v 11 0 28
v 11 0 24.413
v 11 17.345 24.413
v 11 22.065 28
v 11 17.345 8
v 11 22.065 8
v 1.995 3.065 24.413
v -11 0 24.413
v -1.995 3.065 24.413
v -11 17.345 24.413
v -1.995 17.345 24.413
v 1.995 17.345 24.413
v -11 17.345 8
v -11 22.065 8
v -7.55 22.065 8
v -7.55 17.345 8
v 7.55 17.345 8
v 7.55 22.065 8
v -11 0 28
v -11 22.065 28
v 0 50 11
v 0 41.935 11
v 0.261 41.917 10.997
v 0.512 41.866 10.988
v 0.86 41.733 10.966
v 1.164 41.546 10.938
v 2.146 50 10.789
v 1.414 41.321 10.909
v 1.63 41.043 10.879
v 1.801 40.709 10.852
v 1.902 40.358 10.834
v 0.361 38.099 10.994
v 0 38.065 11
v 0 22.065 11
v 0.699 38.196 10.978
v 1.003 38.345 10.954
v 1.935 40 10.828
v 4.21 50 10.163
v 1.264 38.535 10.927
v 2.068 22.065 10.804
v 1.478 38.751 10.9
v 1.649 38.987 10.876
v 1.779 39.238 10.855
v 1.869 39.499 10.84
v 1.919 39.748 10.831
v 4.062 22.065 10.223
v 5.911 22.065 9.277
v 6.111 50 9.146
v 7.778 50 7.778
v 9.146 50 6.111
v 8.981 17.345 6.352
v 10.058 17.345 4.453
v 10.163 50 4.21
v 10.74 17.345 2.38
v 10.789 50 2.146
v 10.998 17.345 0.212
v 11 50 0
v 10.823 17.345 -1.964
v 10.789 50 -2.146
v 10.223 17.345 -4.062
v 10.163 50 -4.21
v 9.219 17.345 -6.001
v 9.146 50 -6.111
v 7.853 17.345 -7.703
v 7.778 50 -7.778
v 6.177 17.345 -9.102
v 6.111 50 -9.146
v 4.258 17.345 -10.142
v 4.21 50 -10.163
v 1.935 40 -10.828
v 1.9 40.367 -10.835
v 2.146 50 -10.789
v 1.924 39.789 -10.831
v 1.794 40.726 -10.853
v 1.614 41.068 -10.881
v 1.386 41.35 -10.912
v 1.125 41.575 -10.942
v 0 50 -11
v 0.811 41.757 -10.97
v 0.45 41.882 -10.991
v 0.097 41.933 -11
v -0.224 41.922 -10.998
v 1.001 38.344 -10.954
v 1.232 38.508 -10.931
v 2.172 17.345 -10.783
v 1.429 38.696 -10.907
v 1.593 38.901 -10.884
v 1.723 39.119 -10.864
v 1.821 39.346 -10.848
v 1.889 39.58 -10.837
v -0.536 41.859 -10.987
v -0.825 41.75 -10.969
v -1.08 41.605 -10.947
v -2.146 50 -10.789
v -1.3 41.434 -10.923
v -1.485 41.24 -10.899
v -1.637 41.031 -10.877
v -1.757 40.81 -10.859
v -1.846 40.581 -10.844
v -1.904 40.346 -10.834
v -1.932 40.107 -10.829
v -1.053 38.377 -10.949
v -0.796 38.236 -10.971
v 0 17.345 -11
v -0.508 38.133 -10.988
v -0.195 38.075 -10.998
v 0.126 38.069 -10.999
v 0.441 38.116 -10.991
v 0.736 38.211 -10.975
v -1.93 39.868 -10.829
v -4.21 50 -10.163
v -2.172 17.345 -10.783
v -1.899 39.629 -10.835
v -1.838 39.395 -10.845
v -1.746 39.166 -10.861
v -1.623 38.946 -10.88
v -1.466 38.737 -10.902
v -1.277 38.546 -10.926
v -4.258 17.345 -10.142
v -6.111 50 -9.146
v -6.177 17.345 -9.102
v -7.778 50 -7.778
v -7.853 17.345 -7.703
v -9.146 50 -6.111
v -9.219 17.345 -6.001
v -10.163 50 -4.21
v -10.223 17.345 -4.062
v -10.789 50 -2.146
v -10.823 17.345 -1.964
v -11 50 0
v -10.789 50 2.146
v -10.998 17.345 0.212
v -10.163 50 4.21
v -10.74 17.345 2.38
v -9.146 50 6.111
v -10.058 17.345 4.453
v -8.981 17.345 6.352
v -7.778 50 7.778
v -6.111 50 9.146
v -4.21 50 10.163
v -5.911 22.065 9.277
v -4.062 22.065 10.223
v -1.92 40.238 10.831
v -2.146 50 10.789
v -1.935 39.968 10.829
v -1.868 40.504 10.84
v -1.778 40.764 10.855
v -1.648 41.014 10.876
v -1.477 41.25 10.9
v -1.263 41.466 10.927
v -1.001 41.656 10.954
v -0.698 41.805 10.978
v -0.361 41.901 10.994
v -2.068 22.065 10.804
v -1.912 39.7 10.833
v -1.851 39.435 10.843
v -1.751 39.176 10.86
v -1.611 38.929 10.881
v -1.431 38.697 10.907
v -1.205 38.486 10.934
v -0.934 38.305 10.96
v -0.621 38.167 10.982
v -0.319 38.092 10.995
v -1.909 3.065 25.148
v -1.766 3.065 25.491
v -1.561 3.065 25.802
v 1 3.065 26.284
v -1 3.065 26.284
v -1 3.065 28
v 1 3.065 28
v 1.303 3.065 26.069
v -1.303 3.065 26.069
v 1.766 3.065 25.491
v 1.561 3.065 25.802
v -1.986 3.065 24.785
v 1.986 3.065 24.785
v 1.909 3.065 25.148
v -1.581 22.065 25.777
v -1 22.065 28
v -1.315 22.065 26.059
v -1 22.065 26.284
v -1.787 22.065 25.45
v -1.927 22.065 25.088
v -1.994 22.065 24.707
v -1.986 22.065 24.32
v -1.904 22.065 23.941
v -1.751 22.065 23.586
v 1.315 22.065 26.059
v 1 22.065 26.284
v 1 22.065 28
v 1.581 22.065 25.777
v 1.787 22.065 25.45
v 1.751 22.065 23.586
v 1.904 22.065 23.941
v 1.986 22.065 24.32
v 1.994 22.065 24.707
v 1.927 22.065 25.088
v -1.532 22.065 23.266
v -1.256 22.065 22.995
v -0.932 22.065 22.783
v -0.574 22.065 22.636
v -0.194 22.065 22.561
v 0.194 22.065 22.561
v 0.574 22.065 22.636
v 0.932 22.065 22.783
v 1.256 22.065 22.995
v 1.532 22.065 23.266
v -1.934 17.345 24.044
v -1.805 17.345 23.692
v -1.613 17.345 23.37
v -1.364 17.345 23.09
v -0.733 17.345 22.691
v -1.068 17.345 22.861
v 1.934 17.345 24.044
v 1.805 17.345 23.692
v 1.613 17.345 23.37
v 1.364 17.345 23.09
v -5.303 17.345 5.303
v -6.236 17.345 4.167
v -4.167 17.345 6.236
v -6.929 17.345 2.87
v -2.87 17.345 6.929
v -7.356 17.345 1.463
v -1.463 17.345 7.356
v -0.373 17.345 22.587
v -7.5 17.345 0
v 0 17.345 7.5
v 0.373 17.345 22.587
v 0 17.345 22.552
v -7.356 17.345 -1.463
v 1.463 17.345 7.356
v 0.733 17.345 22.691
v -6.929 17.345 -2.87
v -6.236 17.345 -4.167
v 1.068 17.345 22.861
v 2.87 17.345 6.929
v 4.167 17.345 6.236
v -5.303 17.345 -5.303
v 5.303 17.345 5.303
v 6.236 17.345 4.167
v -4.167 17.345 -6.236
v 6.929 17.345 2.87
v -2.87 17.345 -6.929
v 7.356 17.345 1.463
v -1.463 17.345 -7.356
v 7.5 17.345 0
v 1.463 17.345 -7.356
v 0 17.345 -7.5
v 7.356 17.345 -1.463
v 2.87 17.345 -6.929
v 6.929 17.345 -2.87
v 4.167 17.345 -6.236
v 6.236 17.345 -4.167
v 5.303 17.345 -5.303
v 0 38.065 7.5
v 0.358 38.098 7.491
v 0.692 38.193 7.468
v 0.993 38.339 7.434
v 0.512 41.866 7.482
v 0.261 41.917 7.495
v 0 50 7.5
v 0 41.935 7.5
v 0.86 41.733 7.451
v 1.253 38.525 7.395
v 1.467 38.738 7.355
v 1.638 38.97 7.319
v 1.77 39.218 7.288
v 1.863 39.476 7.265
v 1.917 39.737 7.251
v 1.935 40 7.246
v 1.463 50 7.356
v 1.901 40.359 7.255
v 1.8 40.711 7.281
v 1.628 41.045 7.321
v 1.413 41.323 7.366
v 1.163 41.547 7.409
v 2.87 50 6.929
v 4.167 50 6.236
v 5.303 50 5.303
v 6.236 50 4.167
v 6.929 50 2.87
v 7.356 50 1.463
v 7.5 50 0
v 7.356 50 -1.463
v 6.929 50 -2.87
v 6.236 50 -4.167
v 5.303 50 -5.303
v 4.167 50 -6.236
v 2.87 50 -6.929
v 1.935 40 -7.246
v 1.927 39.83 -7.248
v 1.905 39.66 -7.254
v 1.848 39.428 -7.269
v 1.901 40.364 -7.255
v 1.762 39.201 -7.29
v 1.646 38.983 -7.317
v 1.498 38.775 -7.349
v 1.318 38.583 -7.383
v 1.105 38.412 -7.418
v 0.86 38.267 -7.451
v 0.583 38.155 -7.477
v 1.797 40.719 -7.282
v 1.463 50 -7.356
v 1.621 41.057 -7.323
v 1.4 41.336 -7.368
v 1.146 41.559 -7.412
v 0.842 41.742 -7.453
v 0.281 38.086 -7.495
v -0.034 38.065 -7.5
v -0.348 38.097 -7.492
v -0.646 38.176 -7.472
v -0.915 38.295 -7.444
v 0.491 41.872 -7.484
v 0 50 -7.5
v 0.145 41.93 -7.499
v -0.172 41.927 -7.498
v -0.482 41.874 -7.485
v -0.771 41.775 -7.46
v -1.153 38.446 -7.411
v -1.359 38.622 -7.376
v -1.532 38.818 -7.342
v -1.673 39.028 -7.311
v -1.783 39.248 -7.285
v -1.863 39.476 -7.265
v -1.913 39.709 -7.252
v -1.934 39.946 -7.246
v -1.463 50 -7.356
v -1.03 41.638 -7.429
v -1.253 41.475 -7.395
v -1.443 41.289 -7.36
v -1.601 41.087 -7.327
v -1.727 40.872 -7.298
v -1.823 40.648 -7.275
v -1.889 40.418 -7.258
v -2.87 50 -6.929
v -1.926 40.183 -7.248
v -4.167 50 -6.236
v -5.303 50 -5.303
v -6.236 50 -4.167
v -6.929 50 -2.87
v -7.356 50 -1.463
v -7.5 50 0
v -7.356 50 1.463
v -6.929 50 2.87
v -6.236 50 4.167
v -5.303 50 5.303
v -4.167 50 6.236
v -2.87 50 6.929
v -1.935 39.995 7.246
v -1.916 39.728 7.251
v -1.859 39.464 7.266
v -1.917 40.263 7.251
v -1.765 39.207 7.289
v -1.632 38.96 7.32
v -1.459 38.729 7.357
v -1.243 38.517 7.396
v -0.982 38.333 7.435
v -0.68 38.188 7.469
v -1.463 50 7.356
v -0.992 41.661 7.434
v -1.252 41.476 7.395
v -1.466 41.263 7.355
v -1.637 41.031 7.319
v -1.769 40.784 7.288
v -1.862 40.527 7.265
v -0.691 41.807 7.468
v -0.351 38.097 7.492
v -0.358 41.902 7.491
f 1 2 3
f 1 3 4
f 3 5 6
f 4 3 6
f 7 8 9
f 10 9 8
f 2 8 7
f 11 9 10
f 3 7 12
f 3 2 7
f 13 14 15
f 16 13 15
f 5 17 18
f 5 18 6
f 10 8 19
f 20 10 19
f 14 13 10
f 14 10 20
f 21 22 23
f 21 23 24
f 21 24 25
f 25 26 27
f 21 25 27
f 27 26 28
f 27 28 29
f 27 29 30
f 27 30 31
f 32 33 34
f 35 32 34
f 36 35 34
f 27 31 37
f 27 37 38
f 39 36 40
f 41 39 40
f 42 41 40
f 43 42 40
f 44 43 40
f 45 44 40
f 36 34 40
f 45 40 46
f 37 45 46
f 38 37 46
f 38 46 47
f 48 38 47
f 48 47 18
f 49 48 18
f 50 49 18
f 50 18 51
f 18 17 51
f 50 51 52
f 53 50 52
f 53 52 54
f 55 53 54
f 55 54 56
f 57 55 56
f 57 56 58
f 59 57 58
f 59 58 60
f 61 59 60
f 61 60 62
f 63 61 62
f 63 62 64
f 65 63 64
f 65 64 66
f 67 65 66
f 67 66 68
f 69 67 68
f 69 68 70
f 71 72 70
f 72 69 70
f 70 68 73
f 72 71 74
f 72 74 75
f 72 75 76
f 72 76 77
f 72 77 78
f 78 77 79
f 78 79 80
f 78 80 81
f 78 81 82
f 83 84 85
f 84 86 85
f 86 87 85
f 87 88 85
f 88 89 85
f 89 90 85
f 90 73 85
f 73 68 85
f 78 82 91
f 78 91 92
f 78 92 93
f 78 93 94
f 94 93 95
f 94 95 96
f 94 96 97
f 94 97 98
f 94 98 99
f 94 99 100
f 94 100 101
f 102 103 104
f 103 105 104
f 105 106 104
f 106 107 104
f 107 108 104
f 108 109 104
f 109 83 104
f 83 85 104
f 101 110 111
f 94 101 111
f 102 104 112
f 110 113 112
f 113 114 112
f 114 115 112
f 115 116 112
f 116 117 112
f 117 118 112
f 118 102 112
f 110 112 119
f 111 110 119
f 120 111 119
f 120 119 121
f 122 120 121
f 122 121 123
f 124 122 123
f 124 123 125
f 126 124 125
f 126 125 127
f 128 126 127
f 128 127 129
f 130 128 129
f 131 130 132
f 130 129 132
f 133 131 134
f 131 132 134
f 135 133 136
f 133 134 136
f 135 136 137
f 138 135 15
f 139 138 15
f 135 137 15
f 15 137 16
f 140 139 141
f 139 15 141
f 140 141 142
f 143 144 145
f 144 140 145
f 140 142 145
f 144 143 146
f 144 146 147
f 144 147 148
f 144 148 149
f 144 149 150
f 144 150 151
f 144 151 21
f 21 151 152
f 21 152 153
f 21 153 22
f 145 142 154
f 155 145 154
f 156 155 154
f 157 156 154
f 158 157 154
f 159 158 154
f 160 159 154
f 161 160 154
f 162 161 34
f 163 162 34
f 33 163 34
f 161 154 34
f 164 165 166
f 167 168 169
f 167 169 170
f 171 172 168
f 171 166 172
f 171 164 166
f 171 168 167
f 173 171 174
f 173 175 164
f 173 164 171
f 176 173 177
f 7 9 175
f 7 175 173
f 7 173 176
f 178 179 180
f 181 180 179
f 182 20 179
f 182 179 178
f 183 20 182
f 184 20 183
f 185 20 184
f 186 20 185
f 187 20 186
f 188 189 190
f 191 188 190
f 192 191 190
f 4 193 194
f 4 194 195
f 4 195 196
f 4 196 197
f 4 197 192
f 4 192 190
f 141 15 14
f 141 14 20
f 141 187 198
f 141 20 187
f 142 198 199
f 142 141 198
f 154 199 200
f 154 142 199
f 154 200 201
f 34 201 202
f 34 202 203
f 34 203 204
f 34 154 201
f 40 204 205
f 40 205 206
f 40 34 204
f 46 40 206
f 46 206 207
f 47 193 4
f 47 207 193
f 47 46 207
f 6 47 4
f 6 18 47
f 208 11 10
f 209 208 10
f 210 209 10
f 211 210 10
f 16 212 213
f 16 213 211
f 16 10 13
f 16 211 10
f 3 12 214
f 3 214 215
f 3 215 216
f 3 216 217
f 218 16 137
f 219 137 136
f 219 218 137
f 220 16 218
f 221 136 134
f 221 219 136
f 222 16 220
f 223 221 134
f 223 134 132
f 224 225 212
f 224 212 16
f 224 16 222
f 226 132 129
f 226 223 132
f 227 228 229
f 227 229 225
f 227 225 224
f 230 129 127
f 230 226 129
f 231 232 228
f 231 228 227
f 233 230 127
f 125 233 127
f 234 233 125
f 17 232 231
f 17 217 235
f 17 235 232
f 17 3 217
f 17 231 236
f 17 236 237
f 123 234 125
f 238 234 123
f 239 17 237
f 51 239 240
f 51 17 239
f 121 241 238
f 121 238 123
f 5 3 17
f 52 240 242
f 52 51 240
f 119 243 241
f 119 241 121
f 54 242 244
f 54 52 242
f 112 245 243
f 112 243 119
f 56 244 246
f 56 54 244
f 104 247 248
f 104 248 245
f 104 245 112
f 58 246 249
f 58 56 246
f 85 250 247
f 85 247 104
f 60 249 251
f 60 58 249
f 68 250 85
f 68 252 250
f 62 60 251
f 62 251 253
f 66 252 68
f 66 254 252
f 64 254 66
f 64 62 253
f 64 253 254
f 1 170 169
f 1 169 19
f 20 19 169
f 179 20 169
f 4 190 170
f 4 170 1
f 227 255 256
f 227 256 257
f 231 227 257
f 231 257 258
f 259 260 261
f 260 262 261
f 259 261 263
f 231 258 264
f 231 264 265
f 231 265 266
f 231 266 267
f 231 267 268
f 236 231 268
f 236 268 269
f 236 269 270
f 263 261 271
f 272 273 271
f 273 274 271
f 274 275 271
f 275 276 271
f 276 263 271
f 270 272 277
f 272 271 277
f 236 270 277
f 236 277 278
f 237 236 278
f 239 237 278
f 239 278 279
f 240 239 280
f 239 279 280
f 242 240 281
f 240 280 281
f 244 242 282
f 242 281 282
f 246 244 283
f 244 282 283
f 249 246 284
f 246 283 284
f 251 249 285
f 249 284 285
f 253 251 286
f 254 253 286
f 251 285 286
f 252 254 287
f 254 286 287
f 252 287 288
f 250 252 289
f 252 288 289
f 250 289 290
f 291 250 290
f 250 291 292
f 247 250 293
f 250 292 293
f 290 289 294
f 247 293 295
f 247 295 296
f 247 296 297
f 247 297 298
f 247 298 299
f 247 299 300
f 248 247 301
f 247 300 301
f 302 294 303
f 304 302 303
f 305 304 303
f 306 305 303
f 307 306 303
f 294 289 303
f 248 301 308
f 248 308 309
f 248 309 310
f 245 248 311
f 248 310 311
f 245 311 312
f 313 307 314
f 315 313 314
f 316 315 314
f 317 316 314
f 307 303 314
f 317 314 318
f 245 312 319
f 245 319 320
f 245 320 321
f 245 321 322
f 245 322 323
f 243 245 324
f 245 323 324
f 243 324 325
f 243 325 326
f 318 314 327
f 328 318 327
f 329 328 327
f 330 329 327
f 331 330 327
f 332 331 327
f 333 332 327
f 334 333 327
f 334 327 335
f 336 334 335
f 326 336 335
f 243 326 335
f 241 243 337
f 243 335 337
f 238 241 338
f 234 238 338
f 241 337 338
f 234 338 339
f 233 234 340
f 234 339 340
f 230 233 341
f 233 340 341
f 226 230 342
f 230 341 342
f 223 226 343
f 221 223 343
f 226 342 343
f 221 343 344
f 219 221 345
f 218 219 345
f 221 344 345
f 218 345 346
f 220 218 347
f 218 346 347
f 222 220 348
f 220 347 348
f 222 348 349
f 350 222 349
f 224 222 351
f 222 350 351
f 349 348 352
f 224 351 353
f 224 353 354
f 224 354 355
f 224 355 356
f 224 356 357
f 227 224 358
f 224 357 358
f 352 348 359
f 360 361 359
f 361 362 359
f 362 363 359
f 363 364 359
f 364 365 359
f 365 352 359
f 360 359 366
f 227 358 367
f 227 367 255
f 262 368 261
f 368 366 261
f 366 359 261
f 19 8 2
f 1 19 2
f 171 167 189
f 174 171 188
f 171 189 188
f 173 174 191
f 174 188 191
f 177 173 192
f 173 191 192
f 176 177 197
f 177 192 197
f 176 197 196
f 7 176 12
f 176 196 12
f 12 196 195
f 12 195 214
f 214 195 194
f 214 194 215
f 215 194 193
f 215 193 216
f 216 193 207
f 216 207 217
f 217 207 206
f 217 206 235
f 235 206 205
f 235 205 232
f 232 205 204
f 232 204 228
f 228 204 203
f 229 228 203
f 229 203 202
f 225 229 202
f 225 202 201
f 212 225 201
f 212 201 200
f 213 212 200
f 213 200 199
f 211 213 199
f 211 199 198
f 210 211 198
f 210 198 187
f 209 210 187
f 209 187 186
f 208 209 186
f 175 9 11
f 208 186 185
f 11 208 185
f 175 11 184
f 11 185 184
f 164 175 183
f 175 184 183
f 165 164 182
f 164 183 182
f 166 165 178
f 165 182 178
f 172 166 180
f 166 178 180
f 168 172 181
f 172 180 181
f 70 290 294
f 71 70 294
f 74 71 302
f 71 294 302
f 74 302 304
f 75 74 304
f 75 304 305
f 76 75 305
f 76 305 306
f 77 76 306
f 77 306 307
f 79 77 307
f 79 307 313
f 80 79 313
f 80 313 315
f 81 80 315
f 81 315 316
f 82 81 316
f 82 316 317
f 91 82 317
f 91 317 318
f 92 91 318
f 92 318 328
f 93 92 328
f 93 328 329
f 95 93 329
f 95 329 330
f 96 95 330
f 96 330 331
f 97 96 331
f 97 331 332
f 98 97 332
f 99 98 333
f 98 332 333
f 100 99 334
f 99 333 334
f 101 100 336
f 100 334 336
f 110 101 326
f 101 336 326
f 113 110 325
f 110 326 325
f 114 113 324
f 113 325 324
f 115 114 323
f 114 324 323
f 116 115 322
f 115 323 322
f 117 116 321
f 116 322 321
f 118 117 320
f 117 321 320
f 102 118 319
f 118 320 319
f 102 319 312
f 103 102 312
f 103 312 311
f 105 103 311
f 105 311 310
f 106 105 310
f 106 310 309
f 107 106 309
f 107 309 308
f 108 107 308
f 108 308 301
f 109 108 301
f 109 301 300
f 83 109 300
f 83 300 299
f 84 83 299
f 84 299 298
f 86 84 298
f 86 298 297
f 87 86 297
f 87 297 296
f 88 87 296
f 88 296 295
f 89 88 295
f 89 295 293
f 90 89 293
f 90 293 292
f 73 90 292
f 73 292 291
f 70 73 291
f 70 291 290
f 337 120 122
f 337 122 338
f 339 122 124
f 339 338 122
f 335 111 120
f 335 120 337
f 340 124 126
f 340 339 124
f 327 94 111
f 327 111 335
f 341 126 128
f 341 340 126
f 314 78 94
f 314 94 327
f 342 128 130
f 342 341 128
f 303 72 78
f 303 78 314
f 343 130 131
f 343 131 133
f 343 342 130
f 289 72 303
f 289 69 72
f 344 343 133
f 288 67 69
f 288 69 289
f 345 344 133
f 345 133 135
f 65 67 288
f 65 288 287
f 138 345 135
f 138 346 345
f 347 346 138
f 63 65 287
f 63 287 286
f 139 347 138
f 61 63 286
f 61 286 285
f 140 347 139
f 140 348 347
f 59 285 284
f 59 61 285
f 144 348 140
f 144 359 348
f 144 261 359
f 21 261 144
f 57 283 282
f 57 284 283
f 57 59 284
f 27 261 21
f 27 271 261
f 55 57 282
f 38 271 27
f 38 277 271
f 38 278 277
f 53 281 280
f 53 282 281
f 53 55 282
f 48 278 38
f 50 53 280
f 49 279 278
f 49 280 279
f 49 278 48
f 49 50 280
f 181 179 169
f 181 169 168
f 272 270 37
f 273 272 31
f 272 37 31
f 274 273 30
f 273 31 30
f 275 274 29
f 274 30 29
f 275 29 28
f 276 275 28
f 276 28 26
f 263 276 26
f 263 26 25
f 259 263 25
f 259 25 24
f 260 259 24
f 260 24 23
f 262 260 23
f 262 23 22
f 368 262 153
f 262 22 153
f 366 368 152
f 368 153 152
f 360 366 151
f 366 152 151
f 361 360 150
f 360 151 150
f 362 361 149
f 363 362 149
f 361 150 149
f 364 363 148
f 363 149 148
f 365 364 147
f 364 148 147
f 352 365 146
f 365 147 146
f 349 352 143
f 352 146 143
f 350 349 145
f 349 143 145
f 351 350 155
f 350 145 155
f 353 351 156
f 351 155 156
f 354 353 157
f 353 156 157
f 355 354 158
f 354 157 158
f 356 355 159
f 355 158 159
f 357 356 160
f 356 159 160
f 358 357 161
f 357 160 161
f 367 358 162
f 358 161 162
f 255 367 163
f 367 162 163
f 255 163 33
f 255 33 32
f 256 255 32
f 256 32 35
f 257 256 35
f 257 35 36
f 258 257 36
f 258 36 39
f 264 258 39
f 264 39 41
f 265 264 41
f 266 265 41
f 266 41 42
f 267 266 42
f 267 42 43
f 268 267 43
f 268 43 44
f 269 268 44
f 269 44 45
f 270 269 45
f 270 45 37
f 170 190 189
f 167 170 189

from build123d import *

# Parameters (mm, degrees)
SKETCH_1_R           = 11
EXTRUDE_1_DEPTH      = 50
SKETCH_2_R           = 7.5
CUT_EXTRUDE_1_DEPTH  = 53.364109846
SKETCH_4_R           = 1.935
CUT_EXTRUDE_4_DEPTH  = 50
EXTRUDE_2_DEPTH      = 10
EXTRUDE_2_DEPTH_BACK = 10
SKETCH_11_W          = 22
SKETCH_11_H          = 22.065
SKETCH_35_W          = 2
SKETCH_35_H          = 4.895889032
CUT_EXTRUDE_5_DEPTH  = 19
SKETCH_36_R          = 2
CUT_EXTRUDE_6_DEPTH  = 19
SKETCH_38_W          = 35.522416841
SKETCH_38_H          = 17.874337136
CUT_EXTRUDE_7_DEPTH  = 29


with BuildPart() as part:
    # 草圖1 → 填料-伸長1 (new body)
    with BuildSketch(Plane(origin=(0, 0, 0), x_dir=(1, 0, 0), z_dir=(0, 1, 0))):
        Circle(SKETCH_1_R)
    extrude(amount=EXTRUDE_1_DEPTH)

    # 草圖2 → 除料-伸長1 (cut, through all)
    with BuildSketch(Plane(origin=(0, 50, 0), x_dir=(1, 0, 0), z_dir=(0, 1, 0))):
        Circle(SKETCH_2_R)
    extrude(amount=-CUT_EXTRUDE_1_DEPTH, mode=Mode.SUBTRACT)

    # 草圖4 → 除料-伸長4 (cut)
    with BuildSketch(Plane.XY.offset(18)):
        with Locations((0, 40)):
            Circle(SKETCH_4_R)
    extrude(amount=-CUT_EXTRUDE_4_DEPTH, mode=Mode.SUBTRACT)

    # 草圖11 → 填料-伸長2 (add, two sides: drawn at the far end of the back side and taken through both)
    with BuildSketch(Plane.XY.offset(18).offset(-EXTRUDE_2_DEPTH_BACK)):
        with Locations((0, 11.0325)):
            Rectangle(SKETCH_11_W, SKETCH_11_H)
    extrude(amount=EXTRUDE_2_DEPTH + EXTRUDE_2_DEPTH_BACK)

    # 草圖35 → 除料-伸長5 (cut)
    with BuildSketch(Plane(origin=(0, 22.065, 0), x_dir=(1, 0, 0), z_dir=(0, 1, 0))):
        with Locations((0, -28)):
            Rectangle(SKETCH_35_W, SKETCH_35_H)
    extrude(amount=-CUT_EXTRUDE_5_DEPTH, mode=Mode.SUBTRACT)

    # 草圖36 → 除料-伸長6 (cut)
    with BuildSketch(Plane(origin=(0, 22.065, 0), x_dir=(1, 0, 0), z_dir=(0, 1, 0))):
        with Locations((0, -24.552055484)):
            Circle(SKETCH_36_R)
    extrude(amount=-CUT_EXTRUDE_6_DEPTH, mode=Mode.SUBTRACT)

    # 草圖38 → 除料-伸長7 (cut)
    with BuildSketch(Plane(origin=(11, 0, 0), x_dir=(0, 0, -1), z_dir=(1, 0, 0))):
        with Locations((-6.652230971, 8.407788312)):
            Rectangle(SKETCH_38_W, SKETCH_38_H)
    extrude(amount=-CUT_EXTRUDE_7_DEPTH, mode=Mode.SUBTRACT)


solid = part.part
